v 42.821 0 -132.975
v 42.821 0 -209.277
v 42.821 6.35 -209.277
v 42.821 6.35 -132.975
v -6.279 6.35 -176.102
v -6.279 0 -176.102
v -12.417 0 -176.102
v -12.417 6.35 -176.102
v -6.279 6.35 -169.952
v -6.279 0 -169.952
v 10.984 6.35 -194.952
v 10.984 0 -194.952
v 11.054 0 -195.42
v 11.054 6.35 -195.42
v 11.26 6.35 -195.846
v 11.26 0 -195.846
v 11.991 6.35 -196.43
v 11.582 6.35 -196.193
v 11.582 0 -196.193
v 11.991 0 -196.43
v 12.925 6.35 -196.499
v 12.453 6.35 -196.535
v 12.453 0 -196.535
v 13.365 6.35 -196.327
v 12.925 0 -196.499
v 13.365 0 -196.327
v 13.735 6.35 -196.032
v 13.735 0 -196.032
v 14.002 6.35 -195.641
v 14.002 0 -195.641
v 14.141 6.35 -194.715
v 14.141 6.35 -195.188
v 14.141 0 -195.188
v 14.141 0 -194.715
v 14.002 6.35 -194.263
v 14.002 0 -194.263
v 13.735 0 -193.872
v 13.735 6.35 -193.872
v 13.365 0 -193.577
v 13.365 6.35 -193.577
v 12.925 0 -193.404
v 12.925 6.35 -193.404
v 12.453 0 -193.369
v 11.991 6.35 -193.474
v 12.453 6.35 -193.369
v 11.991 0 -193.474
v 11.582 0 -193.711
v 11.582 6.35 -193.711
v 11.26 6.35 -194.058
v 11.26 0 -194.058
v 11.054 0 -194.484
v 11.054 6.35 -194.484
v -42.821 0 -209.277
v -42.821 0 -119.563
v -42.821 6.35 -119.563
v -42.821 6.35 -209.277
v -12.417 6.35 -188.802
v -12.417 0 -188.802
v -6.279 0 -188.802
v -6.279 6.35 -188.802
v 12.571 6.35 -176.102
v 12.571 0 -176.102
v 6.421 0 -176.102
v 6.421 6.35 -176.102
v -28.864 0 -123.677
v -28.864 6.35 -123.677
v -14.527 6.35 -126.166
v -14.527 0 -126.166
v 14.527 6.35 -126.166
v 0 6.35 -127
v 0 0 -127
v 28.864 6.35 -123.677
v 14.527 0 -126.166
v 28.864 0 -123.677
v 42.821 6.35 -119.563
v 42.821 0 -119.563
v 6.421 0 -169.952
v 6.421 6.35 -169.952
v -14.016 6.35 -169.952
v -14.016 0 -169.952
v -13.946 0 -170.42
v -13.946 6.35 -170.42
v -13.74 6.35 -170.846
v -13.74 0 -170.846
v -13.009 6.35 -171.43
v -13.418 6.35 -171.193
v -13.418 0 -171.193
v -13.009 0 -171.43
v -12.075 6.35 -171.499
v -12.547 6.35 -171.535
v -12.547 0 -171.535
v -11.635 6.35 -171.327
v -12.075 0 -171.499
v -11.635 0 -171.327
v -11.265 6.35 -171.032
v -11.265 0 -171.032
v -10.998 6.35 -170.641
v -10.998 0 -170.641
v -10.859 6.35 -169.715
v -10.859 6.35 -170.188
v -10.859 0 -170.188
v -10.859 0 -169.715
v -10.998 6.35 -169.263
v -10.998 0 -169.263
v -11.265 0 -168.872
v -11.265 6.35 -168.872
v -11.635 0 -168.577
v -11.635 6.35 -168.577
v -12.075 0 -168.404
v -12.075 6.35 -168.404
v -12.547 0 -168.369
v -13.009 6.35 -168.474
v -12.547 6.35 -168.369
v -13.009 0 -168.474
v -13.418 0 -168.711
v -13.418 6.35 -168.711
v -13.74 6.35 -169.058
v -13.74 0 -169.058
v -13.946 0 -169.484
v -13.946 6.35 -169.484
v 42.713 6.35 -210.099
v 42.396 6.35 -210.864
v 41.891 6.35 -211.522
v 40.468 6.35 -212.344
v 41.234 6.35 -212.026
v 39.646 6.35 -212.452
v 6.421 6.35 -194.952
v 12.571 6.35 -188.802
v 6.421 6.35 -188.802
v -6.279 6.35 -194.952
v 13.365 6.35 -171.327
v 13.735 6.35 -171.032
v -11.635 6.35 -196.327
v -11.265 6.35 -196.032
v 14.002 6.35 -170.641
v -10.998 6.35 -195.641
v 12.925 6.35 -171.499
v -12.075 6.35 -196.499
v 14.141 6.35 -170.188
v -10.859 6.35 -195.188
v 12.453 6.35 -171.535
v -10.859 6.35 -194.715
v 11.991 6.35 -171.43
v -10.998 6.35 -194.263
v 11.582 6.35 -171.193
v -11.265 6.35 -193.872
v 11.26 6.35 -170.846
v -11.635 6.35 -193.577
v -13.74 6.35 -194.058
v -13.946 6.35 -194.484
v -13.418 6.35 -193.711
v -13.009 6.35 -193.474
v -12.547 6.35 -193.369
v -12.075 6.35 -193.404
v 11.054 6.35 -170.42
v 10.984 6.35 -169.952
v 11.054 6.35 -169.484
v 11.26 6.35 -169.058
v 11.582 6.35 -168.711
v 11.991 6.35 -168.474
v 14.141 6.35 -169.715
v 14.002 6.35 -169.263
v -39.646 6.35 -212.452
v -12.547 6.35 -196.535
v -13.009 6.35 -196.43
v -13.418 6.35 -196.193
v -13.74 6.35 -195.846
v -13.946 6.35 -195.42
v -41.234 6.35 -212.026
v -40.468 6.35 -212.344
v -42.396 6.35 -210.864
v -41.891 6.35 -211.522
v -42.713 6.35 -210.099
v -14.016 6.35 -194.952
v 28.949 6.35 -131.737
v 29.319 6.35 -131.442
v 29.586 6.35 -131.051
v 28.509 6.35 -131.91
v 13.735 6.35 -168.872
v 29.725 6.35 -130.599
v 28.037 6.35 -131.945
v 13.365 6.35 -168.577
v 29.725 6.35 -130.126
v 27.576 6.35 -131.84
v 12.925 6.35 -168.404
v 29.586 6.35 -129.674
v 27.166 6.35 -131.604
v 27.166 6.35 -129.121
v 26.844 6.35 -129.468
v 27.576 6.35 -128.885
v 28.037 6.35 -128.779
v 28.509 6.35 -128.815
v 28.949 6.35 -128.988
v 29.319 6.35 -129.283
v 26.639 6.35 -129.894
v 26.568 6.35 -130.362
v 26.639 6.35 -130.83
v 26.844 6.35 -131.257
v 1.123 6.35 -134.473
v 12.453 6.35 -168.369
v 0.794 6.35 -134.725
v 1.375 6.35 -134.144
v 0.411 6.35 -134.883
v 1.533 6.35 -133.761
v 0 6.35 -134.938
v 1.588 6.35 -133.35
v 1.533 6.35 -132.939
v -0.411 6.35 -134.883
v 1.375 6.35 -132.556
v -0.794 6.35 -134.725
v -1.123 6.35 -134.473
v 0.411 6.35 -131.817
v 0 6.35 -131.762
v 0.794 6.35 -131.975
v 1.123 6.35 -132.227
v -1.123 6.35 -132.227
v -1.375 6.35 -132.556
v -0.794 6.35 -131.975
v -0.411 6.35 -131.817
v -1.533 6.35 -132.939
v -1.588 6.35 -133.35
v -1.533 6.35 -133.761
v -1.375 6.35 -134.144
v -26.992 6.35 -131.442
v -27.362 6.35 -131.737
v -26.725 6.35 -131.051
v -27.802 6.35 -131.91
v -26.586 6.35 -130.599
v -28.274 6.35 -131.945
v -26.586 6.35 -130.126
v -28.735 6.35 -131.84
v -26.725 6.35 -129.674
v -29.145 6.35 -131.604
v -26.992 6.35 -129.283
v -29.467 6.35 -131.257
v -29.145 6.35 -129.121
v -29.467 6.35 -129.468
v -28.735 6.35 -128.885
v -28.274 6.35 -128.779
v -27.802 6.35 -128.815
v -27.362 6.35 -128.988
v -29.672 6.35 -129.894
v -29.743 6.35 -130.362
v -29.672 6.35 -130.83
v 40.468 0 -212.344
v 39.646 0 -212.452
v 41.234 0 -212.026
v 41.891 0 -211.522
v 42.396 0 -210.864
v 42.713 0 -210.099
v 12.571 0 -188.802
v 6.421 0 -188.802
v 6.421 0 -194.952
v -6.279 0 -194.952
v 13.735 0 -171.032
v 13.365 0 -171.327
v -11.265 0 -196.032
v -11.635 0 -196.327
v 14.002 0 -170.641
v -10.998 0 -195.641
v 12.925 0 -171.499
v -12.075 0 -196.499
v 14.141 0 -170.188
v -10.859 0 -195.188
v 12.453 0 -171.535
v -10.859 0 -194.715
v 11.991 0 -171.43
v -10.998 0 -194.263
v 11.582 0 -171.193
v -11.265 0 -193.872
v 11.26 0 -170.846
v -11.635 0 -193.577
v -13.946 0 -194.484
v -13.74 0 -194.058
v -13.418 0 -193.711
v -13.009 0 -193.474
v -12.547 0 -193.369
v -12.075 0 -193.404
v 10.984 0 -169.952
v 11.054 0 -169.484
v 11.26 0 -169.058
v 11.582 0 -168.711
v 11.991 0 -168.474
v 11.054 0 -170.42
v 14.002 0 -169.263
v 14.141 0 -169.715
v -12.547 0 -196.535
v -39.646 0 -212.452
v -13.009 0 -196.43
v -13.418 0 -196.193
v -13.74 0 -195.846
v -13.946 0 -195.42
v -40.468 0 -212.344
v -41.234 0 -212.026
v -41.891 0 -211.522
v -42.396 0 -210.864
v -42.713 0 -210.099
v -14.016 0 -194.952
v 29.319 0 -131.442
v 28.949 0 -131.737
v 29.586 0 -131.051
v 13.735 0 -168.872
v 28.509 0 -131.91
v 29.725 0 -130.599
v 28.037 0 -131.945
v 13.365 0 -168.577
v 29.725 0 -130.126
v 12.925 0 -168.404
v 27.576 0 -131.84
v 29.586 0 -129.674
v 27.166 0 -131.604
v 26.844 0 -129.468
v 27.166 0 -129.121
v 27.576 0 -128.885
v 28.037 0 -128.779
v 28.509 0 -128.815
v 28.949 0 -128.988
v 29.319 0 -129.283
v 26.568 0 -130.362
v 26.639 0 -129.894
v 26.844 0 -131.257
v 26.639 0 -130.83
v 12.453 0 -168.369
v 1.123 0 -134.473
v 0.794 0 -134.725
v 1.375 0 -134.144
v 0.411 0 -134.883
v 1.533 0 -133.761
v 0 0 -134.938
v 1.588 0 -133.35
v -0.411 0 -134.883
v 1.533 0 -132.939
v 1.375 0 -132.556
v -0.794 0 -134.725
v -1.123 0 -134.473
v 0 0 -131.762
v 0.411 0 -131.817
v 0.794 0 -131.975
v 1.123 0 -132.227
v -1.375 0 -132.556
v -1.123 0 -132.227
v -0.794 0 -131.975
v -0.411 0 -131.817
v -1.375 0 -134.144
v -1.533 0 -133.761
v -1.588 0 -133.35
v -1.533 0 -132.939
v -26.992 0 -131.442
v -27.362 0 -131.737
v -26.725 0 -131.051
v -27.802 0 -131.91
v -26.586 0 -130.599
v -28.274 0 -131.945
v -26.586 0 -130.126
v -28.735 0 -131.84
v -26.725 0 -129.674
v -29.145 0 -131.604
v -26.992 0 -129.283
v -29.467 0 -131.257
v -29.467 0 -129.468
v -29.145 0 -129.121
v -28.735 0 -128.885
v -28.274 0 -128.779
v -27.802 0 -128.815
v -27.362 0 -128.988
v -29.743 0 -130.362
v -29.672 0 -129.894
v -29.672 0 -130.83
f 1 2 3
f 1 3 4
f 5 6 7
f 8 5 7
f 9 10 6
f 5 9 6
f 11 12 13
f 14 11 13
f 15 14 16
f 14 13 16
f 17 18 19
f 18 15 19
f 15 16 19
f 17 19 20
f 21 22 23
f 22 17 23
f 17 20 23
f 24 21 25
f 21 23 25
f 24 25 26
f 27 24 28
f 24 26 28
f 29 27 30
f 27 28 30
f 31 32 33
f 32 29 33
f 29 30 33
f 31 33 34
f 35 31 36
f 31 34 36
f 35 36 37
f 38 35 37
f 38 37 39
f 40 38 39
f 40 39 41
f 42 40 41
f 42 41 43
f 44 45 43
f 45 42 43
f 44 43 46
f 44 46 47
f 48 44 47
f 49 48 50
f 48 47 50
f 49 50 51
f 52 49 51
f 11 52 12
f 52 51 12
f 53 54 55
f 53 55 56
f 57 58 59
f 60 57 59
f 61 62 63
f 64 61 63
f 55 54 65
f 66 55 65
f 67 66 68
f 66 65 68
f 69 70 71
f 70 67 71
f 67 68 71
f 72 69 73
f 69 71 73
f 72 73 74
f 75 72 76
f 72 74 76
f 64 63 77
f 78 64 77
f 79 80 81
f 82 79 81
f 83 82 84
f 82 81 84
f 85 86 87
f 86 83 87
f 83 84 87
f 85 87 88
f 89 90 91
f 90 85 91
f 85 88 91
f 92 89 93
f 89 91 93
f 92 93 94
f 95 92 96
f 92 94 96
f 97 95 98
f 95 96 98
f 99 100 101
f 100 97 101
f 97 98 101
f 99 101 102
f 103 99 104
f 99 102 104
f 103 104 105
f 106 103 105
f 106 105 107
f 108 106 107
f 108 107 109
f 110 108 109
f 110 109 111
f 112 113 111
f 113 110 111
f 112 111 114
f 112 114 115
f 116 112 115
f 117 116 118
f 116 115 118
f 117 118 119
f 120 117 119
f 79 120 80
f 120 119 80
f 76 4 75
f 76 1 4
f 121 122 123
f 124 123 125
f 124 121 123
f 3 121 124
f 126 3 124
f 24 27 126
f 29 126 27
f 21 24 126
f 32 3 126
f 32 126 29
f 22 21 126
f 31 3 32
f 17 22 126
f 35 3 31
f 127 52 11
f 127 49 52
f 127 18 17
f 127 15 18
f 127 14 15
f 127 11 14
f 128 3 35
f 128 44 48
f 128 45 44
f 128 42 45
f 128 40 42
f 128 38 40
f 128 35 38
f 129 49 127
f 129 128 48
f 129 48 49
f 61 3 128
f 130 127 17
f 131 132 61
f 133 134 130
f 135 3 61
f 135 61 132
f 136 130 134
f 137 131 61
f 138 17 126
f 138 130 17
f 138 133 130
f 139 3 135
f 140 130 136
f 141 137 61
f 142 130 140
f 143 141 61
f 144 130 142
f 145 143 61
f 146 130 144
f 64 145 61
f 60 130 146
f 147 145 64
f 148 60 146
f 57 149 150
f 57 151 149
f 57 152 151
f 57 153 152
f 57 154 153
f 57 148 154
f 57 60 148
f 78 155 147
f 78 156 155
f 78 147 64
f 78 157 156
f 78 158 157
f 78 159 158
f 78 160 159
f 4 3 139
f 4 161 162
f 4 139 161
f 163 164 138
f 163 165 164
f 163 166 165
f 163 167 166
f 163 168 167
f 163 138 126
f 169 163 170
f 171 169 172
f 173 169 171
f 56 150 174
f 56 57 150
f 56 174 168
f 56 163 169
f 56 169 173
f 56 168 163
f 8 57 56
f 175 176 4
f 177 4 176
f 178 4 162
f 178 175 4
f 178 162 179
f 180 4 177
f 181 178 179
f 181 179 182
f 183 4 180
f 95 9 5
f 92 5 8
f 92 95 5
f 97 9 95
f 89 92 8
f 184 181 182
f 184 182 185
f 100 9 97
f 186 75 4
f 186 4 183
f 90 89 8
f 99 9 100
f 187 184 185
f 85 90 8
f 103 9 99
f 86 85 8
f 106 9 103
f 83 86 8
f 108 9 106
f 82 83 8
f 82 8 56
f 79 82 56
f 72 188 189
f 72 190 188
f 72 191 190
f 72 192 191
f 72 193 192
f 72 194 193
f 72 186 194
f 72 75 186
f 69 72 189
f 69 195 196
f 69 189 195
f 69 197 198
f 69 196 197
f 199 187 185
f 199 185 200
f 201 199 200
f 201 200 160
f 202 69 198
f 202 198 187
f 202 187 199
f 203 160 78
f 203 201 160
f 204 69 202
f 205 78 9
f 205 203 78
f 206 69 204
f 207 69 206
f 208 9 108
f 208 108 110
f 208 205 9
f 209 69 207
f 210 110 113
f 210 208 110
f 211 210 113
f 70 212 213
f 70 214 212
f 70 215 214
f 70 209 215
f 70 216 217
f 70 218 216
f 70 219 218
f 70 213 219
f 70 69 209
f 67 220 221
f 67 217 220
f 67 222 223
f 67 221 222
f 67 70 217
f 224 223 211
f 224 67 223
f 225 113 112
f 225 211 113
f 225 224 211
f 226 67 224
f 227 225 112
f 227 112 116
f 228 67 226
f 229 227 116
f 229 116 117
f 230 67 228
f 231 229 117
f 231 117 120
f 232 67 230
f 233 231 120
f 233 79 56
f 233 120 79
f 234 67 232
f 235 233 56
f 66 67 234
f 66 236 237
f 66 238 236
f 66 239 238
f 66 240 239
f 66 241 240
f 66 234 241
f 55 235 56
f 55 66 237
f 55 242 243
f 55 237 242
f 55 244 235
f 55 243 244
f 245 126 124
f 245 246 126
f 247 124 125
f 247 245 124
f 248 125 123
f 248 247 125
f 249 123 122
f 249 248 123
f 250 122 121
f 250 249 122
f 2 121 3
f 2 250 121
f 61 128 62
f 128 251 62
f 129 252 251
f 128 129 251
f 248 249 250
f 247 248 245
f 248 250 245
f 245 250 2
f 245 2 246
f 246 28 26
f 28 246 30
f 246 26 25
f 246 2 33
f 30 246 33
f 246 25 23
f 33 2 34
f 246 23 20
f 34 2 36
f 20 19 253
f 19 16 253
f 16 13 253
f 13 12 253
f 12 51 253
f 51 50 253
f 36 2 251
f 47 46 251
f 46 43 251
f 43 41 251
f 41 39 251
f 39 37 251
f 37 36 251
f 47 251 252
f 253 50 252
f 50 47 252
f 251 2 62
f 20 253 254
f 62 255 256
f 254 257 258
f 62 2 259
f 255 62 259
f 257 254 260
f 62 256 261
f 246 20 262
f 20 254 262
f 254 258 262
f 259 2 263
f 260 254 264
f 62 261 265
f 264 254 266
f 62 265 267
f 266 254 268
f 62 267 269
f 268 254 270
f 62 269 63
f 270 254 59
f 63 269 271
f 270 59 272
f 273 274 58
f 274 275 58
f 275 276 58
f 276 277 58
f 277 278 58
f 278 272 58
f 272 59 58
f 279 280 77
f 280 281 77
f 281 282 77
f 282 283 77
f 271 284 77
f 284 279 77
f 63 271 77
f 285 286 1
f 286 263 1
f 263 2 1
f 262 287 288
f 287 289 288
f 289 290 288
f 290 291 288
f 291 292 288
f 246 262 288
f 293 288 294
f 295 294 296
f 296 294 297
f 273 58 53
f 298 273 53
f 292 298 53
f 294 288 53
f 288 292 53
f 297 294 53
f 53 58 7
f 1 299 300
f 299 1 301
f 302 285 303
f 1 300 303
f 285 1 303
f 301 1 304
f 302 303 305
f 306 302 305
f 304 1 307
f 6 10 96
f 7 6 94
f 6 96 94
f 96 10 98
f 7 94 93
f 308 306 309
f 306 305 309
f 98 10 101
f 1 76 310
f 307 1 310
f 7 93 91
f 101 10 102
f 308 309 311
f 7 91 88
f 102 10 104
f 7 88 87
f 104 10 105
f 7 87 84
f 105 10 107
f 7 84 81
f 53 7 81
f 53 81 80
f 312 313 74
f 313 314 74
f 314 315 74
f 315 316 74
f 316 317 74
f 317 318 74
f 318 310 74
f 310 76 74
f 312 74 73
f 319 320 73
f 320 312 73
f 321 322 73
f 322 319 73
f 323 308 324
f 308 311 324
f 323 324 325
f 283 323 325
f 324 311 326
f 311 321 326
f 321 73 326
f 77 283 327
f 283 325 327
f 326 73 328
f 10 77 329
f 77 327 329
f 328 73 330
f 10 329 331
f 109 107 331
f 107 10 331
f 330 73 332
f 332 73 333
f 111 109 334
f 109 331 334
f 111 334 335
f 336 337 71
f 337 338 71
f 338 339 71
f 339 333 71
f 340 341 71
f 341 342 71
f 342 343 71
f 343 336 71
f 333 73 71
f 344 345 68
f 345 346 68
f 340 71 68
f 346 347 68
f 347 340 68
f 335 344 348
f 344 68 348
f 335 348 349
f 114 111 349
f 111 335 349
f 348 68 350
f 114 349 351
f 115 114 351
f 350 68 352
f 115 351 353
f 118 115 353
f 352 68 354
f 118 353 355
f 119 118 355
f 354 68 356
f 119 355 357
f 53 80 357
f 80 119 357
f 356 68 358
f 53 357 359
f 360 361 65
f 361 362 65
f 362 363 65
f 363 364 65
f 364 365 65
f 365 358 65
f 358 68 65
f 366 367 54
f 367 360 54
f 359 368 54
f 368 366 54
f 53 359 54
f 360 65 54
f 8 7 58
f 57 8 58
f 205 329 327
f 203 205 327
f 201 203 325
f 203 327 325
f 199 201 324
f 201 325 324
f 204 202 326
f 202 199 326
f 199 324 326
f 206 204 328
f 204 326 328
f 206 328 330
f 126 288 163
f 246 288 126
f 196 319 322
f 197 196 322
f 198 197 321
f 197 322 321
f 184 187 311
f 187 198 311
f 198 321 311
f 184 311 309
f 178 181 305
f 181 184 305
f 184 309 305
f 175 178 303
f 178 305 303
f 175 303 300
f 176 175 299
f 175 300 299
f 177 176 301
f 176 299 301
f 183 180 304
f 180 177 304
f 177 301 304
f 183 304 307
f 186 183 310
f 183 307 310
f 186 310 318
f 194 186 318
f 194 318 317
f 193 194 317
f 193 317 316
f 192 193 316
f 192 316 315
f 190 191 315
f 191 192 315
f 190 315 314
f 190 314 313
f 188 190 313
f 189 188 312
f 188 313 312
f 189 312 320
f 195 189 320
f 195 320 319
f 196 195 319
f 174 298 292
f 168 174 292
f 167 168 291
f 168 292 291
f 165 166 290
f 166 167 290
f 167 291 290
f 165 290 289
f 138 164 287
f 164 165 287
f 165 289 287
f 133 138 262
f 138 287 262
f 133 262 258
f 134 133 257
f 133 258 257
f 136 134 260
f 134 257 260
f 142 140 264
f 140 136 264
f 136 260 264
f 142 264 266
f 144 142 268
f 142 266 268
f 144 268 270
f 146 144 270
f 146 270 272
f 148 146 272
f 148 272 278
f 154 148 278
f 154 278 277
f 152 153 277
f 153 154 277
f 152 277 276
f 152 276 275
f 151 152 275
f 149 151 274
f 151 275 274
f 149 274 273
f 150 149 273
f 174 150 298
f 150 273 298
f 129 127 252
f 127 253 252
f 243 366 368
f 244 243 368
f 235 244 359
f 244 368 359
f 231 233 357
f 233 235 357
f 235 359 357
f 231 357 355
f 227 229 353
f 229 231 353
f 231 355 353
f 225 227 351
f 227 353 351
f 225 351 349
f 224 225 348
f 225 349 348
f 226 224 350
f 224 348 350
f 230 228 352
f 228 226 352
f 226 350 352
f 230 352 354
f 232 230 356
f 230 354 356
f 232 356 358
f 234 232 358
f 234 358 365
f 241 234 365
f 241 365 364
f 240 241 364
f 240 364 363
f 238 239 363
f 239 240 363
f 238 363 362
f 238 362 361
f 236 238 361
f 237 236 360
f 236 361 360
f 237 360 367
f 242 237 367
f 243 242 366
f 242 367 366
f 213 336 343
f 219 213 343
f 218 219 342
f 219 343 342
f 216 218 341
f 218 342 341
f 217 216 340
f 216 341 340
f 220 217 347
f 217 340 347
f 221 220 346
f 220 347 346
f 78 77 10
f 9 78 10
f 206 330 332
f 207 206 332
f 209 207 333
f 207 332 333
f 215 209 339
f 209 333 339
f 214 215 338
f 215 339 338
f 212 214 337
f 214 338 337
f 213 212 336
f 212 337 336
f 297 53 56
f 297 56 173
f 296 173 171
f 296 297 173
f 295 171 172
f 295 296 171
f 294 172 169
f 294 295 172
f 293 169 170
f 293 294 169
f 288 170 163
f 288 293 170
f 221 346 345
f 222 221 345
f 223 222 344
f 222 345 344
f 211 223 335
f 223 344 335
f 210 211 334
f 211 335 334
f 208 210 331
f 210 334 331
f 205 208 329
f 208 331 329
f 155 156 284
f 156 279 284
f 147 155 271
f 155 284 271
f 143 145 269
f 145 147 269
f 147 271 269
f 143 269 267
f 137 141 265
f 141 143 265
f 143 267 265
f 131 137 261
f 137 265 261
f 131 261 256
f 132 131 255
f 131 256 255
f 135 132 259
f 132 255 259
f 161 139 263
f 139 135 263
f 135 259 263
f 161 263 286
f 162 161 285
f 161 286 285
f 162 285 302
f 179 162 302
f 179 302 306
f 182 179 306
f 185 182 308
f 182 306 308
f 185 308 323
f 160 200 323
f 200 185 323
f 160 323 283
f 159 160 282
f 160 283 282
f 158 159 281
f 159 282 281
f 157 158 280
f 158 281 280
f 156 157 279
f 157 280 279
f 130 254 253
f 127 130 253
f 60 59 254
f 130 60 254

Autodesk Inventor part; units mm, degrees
ref_plane "YZ Plane" through (0, 0, 0) normal (1, 0, 0) x (0, 1, 0)
ref_plane "XZ Plane" through (0, 0, 0) normal (0, 1, 0) x (-1, 0, 0)
ref_plane "XY Plane" through (0, 0, 0) normal (0, 0, 1) x (1, 0, 0)
sketch "Sketch1" plane through (0, 0, 0) normal (0, 1, 0) x (-1, 0, 0)
  circle A0 centre (0, -133.35) radius 1.5875
  line L0 (1.5875, -133.35) -> (-1.5875, -133.35)
  line L1 (-42.8213, -132.9753) -> (-42.8213, -119.5631)
  line L2 (-6.4213, -188.8018) -> (-12.5713, -188.8018)
  line L3 (-6.4213, -194.9518) -> (-6.4213, -188.8018)
  line L4 (-12.5713, -188.8018) -> (-12.5713, -176.1018)
  line L5 (-12.5713, -188.8018) -> (-12.5713, -176.1018)
  line L6 (6.2787, -194.9518) -> (-6.4213, -194.9518)
  line L7 (6.2787, -194.9518) -> (-6.4213, -194.9518)
  line L8 (-12.5713, -176.1018) -> (-6.4213, -176.1018)
  line L9 (6.2787, -188.8018) -> (6.2787, -194.9518)
  line L10 (-6.4213, -176.1018) -> (-6.4213, -169.9518)
  line L11 (-6.4213, -194.9518) -> (-6.4213, -169.9518)
  line L12 (6.2787, -169.9518) -> (6.2787, -194.9518)
  line L13 (-6.4213, -169.9518) -> (6.2787, -169.9518)
  line L14 (-6.4213, -169.9518) -> (6.2787, -169.9518)
  line L15 (-12.5713, -176.1018) -> (12.4167, -176.1018)
  line L16 (12.4167, -188.8018) -> (-12.5713, -188.8018)
  circle A1 centre (-12.5713, -194.9518) radius 1.5875
  line L17 (6.2787, -169.9518) -> (6.2787, -176.1018)
  line L18 (12.4167, -188.8018) -> (6.2787, -188.8018)
  line L19 (6.2787, -176.1018) -> (12.4167, -176.1018)
  line L20 (12.4167, -176.1018) -> (12.4167, -188.8018)
  line L21 (12.4167, -176.1018) -> (12.4167, -188.8018)
  line L22 (0, -169.5003) -> (0, -169.4888)
  circle A2 centre (12.4287, -169.9518) radius 1.5875
  circle A3 centre (-12.5713, -169.9518) radius 1.5875
  circle A4 centre (12.4287, -194.9518) radius 1.5875
  circle A5 centre (-28.1555, -130.3624) radius 1.5875
  line L23 (0, -131.7625) -> (0, -134.9375)
  line L24 (-42.8213, -119.5631) -> (42.8213, -119.5631)
  line L25 (42.8213, -119.5631) -> (42.8213, -209.2768)
  line L26 (39.6463, -212.4518) -> (-39.6463, -212.4518)
  line L27 (-42.8213, -209.2768) -> (-42.8213, -119.5631)
  circle A6 centre (28.1555, -130.3624) radius 1.5875
  arc A7 (39.6463, -212.4518) -> (42.8213, -209.2768) centre (39.6463, -209.2768) ccw
  arc A8 (-42.8213, -209.2768) -> (-39.6463, -212.4518) centre (-39.6463, -209.2768) ccw
  arc A9 (-42.8213, -119.5631) -> (42.8213, -119.5631) centre (0, 0) ccw
  point P0 (-26.811, -129.5183)
  point P1 (-26.811, -129.5183)
  point P2 (26.811, -129.5183)
  point P3 (26.811, -129.5183)
  dimension "d0" = 3.175
  dimension "d2" = 36.6018
  dimension "d4" = 25
  dimension "d6" = 3.175
  dimension "d8" = 3.175
  dimension "d9" = 254
extrude "Extrusion1" add sketch "Sketch1" along normal blind 6.35 contours L1 A9 L25 A7 L26 A8 L27
properties part number "Camera_Mount_Acryllic"
